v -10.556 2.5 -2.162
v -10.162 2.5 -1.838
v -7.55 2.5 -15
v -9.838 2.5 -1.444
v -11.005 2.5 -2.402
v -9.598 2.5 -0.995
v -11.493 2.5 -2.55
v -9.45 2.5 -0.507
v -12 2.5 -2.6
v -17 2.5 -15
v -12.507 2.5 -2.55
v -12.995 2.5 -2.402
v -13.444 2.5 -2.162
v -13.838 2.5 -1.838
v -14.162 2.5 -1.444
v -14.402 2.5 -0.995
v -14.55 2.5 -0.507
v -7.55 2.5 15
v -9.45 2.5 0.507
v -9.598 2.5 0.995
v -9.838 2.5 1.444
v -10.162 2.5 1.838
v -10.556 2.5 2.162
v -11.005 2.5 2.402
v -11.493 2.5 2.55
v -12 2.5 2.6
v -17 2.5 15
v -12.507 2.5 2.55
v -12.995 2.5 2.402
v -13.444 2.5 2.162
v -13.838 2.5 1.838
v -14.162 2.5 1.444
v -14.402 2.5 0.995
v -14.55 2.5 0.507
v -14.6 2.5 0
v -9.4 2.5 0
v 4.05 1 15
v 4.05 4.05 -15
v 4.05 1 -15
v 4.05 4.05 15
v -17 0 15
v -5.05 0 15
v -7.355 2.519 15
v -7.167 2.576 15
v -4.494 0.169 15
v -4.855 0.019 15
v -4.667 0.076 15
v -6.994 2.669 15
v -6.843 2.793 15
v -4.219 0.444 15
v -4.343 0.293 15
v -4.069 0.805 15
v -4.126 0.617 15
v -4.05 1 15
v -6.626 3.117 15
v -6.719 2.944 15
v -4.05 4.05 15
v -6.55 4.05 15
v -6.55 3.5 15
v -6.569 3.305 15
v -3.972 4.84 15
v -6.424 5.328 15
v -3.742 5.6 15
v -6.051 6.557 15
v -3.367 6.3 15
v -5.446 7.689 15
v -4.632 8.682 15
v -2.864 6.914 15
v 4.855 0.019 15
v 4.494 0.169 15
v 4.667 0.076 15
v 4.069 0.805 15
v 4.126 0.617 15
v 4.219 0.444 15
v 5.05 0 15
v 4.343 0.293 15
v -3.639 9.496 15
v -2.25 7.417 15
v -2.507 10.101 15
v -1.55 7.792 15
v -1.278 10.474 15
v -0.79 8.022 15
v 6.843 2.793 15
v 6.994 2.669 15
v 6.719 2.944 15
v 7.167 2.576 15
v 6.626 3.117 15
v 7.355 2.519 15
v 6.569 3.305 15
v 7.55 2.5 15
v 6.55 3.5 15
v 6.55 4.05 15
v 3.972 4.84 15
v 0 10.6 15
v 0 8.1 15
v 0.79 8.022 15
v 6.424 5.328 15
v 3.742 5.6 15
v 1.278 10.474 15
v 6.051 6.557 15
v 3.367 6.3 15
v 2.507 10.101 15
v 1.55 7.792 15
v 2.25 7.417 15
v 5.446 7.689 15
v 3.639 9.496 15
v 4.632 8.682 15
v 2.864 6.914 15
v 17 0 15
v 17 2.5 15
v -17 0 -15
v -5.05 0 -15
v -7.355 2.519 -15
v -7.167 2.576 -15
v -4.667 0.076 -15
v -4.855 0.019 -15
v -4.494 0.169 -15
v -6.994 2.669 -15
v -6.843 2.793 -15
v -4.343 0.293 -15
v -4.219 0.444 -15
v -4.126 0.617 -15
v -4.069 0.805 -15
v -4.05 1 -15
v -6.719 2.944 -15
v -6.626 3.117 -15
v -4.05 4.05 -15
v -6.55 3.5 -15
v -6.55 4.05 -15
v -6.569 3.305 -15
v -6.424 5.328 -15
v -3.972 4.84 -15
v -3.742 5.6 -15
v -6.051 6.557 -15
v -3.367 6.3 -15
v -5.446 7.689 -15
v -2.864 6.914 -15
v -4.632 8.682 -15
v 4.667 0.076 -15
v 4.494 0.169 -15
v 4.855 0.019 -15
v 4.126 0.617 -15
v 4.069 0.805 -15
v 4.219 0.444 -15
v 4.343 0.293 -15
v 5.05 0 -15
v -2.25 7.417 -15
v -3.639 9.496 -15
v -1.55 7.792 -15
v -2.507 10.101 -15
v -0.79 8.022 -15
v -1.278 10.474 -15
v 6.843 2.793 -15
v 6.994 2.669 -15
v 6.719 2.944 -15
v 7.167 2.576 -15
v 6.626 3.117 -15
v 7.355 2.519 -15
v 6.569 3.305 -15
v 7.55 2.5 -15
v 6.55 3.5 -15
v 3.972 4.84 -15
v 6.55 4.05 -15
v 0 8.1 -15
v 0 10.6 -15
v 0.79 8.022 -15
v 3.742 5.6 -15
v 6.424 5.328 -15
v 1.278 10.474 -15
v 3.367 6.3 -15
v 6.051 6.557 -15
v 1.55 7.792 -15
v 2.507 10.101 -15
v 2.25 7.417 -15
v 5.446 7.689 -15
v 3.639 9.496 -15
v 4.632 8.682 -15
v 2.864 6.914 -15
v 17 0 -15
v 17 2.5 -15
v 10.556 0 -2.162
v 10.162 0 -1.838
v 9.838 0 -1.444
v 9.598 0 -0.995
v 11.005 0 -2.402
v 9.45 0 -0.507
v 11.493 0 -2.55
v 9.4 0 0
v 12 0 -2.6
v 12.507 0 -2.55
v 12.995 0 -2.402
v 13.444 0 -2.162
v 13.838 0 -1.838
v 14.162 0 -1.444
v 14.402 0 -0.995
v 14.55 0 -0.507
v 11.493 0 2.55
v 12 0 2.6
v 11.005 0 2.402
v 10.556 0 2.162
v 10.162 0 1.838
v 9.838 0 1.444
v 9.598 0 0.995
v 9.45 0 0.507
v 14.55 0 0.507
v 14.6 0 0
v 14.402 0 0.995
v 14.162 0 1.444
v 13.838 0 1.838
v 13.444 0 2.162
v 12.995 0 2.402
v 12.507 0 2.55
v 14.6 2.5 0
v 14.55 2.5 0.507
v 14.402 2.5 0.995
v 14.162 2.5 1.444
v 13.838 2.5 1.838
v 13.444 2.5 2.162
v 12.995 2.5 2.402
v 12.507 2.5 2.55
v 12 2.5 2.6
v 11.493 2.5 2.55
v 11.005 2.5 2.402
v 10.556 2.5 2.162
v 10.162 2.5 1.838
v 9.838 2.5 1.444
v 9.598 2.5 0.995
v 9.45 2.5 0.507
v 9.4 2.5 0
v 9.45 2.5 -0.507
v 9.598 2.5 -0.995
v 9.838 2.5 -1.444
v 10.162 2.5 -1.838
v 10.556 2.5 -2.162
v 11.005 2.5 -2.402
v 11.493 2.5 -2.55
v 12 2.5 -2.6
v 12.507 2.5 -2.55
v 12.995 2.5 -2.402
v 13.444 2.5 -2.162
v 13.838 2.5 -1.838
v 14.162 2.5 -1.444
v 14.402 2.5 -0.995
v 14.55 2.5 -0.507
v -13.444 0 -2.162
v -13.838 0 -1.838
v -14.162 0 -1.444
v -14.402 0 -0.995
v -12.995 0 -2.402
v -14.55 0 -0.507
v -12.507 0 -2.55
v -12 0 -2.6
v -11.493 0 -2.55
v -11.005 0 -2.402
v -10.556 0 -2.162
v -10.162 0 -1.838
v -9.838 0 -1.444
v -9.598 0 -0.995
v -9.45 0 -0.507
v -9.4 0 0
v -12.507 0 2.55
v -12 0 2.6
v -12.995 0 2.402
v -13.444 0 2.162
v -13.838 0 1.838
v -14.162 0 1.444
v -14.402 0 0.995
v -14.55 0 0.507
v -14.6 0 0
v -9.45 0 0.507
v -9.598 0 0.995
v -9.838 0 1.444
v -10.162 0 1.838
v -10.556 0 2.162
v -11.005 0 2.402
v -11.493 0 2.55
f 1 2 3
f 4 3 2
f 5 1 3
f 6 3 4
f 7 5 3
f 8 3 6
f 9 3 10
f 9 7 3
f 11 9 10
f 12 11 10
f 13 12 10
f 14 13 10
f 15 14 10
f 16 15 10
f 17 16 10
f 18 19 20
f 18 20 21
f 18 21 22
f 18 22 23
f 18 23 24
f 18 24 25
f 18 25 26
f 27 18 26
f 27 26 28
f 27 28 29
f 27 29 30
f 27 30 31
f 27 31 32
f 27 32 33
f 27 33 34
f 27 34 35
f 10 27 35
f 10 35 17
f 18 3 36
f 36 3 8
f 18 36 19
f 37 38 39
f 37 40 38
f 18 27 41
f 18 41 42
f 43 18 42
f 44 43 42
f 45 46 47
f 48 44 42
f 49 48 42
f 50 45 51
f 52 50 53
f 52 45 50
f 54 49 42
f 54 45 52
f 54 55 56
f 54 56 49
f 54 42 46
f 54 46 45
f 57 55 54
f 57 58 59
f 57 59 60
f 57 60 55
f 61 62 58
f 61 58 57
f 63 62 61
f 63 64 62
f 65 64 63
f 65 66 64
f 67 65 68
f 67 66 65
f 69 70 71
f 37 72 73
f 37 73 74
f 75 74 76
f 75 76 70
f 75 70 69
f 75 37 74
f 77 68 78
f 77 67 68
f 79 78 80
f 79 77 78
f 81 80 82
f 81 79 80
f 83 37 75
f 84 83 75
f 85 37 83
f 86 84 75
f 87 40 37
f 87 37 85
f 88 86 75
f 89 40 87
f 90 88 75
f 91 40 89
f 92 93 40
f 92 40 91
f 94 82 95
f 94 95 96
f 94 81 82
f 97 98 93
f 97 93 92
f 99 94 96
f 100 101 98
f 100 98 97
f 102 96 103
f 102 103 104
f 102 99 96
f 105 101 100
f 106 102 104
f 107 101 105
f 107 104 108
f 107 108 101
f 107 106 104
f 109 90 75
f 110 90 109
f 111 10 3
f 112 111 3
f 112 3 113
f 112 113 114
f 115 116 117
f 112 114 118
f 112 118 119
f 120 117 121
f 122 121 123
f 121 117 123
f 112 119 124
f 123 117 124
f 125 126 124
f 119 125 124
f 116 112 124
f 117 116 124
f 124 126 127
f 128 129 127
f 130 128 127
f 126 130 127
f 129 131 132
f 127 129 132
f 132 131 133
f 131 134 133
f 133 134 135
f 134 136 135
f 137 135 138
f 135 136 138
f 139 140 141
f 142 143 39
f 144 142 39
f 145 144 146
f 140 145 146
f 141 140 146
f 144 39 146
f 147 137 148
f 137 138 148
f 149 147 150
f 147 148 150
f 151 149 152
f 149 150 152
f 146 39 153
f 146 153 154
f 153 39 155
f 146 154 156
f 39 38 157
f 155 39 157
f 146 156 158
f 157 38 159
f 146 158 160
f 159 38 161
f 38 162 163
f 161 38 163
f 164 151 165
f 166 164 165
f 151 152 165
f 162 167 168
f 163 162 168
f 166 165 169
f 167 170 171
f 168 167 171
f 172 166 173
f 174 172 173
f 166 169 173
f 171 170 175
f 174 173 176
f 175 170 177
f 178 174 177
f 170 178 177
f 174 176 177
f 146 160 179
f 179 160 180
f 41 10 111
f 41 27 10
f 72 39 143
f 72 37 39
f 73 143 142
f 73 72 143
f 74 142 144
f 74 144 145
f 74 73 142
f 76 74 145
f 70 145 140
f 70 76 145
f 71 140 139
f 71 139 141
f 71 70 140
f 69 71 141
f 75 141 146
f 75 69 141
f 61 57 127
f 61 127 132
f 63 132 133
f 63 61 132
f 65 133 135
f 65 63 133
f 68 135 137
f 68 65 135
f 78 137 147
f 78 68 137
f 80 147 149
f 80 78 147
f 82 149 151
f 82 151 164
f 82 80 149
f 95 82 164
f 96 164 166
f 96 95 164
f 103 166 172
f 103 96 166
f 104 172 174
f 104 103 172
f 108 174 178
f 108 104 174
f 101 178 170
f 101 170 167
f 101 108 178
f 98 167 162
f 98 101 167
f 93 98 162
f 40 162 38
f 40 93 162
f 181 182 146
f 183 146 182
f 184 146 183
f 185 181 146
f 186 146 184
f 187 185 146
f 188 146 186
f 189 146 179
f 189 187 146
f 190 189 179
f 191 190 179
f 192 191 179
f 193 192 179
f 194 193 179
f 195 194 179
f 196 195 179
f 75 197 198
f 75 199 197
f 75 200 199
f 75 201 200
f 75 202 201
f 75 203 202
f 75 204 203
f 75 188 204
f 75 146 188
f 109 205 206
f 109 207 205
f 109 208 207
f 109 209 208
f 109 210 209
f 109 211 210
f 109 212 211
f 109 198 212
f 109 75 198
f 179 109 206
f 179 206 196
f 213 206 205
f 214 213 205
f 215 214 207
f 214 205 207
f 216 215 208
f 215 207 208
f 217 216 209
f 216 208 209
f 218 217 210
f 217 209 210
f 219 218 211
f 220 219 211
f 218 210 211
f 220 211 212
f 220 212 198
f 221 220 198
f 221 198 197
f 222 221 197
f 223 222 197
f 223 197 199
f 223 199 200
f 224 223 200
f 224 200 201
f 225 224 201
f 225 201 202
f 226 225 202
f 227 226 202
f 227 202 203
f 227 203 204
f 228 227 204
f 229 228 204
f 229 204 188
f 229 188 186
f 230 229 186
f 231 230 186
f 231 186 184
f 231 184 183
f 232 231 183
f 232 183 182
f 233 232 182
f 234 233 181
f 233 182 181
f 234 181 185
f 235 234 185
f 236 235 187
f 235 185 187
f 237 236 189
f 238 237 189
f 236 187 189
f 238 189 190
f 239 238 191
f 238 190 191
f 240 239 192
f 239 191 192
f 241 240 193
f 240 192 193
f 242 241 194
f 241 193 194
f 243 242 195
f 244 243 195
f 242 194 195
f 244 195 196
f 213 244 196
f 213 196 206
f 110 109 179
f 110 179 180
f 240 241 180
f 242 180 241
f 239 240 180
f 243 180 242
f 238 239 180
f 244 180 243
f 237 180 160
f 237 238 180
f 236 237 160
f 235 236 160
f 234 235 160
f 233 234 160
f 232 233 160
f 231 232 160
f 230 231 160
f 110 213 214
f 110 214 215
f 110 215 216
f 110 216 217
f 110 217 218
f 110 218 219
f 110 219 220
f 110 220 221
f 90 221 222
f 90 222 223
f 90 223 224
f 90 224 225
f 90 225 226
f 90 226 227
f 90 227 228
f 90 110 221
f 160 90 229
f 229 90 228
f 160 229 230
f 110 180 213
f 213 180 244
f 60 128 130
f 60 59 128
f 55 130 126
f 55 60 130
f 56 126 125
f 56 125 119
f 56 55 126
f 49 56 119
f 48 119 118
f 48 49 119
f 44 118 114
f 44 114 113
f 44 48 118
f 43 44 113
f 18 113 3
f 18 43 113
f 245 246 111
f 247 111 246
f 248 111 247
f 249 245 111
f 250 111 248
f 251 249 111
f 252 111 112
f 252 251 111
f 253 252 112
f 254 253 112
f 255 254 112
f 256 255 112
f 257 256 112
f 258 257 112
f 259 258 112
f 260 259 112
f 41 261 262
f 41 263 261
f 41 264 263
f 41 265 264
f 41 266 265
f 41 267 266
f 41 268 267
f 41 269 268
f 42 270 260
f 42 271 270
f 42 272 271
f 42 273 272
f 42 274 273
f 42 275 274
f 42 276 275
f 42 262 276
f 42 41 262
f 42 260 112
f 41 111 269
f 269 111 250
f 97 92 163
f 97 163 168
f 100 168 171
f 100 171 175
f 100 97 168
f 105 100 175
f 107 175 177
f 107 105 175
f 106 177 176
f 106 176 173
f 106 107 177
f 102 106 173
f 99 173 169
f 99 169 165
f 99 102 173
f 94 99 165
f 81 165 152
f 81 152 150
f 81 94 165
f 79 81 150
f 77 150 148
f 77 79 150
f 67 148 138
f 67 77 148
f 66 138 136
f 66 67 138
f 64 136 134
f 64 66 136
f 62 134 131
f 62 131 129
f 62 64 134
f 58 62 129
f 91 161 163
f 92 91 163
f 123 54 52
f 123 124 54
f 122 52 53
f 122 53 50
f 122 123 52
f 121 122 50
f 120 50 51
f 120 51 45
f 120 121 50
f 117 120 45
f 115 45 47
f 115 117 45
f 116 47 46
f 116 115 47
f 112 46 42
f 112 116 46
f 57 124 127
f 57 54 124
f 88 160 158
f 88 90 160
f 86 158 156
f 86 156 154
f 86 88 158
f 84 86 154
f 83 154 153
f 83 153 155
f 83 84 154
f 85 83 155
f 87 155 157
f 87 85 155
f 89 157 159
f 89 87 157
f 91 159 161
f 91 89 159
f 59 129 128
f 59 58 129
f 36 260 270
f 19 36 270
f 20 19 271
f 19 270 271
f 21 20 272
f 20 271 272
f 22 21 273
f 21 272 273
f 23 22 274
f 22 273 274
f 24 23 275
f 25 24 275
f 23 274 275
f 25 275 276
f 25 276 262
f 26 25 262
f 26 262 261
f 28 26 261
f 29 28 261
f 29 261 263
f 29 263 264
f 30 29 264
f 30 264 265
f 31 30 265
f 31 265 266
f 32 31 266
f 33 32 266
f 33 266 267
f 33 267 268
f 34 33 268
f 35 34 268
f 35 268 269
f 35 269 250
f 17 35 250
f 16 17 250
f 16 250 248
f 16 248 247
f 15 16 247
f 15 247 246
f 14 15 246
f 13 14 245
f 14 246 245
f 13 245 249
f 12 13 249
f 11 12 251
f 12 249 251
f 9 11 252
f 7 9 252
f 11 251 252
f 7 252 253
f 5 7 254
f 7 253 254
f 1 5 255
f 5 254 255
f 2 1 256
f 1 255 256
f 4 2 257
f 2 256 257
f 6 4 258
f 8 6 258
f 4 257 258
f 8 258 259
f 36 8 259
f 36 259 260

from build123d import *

# Parameters (mm, degrees)
F1_DEPTH = 15
F2_R     = 2.6
F3_DEPTH = 10.601
F4_R     = 1


with BuildPart() as f1:
    # F0 (on Top) → F1 (new body, symmetric)
    with BuildSketch(Plane.XY):
        with BuildLine():
            Line((-4.05, 0), (-4.05, 4.05))
            ThreePointArc((-4.05, 4.05), (0, 8.1), (4.05, 4.05))
            Line((4.05, 4.05), (4.05, 0))
            Line((4.05, 0), (17, 0))
            Line((17, 0), (17, 2.5))
            Line((17, 2.5), (6.55, 2.5))
            Line((6.55, 2.5), (6.55, 4.05))
            ThreePointArc((6.55, 4.05), (0, 10.6), (-6.55, 4.05))
            Line((-6.55, 4.05), (-6.55, 2.5))
            Line((-6.55, 2.5), (-17, 2.5))
            Line((-17, 2.5), (-17, 0))
            Line((-17, 0), (-4.05, 0))
        make_face()
    extrude(amount=F1_DEPTH, both=True)

    # F2 (on face) → F3 (cut, through all)
    with BuildSketch(Plane.XZ):
        with Locations((-12, 0)):
            Circle(F2_R)
        with Locations((12, 0)):
            Circle(F2_R)
    extrude(amount=-F3_DEPTH, mode=Mode.SUBTRACT)

    # F4
    f4_edges = [f1.edges().sort_by_distance(p)[0] for p in [
        (-4.05, 0, 0),
        (4.05, 0, 0),
        (6.55, 2.5, 0),
        (-6.55, 2.5, 0),
    ]]
    fillet(f4_edges, radius=F4_R)


solid = f1.part
